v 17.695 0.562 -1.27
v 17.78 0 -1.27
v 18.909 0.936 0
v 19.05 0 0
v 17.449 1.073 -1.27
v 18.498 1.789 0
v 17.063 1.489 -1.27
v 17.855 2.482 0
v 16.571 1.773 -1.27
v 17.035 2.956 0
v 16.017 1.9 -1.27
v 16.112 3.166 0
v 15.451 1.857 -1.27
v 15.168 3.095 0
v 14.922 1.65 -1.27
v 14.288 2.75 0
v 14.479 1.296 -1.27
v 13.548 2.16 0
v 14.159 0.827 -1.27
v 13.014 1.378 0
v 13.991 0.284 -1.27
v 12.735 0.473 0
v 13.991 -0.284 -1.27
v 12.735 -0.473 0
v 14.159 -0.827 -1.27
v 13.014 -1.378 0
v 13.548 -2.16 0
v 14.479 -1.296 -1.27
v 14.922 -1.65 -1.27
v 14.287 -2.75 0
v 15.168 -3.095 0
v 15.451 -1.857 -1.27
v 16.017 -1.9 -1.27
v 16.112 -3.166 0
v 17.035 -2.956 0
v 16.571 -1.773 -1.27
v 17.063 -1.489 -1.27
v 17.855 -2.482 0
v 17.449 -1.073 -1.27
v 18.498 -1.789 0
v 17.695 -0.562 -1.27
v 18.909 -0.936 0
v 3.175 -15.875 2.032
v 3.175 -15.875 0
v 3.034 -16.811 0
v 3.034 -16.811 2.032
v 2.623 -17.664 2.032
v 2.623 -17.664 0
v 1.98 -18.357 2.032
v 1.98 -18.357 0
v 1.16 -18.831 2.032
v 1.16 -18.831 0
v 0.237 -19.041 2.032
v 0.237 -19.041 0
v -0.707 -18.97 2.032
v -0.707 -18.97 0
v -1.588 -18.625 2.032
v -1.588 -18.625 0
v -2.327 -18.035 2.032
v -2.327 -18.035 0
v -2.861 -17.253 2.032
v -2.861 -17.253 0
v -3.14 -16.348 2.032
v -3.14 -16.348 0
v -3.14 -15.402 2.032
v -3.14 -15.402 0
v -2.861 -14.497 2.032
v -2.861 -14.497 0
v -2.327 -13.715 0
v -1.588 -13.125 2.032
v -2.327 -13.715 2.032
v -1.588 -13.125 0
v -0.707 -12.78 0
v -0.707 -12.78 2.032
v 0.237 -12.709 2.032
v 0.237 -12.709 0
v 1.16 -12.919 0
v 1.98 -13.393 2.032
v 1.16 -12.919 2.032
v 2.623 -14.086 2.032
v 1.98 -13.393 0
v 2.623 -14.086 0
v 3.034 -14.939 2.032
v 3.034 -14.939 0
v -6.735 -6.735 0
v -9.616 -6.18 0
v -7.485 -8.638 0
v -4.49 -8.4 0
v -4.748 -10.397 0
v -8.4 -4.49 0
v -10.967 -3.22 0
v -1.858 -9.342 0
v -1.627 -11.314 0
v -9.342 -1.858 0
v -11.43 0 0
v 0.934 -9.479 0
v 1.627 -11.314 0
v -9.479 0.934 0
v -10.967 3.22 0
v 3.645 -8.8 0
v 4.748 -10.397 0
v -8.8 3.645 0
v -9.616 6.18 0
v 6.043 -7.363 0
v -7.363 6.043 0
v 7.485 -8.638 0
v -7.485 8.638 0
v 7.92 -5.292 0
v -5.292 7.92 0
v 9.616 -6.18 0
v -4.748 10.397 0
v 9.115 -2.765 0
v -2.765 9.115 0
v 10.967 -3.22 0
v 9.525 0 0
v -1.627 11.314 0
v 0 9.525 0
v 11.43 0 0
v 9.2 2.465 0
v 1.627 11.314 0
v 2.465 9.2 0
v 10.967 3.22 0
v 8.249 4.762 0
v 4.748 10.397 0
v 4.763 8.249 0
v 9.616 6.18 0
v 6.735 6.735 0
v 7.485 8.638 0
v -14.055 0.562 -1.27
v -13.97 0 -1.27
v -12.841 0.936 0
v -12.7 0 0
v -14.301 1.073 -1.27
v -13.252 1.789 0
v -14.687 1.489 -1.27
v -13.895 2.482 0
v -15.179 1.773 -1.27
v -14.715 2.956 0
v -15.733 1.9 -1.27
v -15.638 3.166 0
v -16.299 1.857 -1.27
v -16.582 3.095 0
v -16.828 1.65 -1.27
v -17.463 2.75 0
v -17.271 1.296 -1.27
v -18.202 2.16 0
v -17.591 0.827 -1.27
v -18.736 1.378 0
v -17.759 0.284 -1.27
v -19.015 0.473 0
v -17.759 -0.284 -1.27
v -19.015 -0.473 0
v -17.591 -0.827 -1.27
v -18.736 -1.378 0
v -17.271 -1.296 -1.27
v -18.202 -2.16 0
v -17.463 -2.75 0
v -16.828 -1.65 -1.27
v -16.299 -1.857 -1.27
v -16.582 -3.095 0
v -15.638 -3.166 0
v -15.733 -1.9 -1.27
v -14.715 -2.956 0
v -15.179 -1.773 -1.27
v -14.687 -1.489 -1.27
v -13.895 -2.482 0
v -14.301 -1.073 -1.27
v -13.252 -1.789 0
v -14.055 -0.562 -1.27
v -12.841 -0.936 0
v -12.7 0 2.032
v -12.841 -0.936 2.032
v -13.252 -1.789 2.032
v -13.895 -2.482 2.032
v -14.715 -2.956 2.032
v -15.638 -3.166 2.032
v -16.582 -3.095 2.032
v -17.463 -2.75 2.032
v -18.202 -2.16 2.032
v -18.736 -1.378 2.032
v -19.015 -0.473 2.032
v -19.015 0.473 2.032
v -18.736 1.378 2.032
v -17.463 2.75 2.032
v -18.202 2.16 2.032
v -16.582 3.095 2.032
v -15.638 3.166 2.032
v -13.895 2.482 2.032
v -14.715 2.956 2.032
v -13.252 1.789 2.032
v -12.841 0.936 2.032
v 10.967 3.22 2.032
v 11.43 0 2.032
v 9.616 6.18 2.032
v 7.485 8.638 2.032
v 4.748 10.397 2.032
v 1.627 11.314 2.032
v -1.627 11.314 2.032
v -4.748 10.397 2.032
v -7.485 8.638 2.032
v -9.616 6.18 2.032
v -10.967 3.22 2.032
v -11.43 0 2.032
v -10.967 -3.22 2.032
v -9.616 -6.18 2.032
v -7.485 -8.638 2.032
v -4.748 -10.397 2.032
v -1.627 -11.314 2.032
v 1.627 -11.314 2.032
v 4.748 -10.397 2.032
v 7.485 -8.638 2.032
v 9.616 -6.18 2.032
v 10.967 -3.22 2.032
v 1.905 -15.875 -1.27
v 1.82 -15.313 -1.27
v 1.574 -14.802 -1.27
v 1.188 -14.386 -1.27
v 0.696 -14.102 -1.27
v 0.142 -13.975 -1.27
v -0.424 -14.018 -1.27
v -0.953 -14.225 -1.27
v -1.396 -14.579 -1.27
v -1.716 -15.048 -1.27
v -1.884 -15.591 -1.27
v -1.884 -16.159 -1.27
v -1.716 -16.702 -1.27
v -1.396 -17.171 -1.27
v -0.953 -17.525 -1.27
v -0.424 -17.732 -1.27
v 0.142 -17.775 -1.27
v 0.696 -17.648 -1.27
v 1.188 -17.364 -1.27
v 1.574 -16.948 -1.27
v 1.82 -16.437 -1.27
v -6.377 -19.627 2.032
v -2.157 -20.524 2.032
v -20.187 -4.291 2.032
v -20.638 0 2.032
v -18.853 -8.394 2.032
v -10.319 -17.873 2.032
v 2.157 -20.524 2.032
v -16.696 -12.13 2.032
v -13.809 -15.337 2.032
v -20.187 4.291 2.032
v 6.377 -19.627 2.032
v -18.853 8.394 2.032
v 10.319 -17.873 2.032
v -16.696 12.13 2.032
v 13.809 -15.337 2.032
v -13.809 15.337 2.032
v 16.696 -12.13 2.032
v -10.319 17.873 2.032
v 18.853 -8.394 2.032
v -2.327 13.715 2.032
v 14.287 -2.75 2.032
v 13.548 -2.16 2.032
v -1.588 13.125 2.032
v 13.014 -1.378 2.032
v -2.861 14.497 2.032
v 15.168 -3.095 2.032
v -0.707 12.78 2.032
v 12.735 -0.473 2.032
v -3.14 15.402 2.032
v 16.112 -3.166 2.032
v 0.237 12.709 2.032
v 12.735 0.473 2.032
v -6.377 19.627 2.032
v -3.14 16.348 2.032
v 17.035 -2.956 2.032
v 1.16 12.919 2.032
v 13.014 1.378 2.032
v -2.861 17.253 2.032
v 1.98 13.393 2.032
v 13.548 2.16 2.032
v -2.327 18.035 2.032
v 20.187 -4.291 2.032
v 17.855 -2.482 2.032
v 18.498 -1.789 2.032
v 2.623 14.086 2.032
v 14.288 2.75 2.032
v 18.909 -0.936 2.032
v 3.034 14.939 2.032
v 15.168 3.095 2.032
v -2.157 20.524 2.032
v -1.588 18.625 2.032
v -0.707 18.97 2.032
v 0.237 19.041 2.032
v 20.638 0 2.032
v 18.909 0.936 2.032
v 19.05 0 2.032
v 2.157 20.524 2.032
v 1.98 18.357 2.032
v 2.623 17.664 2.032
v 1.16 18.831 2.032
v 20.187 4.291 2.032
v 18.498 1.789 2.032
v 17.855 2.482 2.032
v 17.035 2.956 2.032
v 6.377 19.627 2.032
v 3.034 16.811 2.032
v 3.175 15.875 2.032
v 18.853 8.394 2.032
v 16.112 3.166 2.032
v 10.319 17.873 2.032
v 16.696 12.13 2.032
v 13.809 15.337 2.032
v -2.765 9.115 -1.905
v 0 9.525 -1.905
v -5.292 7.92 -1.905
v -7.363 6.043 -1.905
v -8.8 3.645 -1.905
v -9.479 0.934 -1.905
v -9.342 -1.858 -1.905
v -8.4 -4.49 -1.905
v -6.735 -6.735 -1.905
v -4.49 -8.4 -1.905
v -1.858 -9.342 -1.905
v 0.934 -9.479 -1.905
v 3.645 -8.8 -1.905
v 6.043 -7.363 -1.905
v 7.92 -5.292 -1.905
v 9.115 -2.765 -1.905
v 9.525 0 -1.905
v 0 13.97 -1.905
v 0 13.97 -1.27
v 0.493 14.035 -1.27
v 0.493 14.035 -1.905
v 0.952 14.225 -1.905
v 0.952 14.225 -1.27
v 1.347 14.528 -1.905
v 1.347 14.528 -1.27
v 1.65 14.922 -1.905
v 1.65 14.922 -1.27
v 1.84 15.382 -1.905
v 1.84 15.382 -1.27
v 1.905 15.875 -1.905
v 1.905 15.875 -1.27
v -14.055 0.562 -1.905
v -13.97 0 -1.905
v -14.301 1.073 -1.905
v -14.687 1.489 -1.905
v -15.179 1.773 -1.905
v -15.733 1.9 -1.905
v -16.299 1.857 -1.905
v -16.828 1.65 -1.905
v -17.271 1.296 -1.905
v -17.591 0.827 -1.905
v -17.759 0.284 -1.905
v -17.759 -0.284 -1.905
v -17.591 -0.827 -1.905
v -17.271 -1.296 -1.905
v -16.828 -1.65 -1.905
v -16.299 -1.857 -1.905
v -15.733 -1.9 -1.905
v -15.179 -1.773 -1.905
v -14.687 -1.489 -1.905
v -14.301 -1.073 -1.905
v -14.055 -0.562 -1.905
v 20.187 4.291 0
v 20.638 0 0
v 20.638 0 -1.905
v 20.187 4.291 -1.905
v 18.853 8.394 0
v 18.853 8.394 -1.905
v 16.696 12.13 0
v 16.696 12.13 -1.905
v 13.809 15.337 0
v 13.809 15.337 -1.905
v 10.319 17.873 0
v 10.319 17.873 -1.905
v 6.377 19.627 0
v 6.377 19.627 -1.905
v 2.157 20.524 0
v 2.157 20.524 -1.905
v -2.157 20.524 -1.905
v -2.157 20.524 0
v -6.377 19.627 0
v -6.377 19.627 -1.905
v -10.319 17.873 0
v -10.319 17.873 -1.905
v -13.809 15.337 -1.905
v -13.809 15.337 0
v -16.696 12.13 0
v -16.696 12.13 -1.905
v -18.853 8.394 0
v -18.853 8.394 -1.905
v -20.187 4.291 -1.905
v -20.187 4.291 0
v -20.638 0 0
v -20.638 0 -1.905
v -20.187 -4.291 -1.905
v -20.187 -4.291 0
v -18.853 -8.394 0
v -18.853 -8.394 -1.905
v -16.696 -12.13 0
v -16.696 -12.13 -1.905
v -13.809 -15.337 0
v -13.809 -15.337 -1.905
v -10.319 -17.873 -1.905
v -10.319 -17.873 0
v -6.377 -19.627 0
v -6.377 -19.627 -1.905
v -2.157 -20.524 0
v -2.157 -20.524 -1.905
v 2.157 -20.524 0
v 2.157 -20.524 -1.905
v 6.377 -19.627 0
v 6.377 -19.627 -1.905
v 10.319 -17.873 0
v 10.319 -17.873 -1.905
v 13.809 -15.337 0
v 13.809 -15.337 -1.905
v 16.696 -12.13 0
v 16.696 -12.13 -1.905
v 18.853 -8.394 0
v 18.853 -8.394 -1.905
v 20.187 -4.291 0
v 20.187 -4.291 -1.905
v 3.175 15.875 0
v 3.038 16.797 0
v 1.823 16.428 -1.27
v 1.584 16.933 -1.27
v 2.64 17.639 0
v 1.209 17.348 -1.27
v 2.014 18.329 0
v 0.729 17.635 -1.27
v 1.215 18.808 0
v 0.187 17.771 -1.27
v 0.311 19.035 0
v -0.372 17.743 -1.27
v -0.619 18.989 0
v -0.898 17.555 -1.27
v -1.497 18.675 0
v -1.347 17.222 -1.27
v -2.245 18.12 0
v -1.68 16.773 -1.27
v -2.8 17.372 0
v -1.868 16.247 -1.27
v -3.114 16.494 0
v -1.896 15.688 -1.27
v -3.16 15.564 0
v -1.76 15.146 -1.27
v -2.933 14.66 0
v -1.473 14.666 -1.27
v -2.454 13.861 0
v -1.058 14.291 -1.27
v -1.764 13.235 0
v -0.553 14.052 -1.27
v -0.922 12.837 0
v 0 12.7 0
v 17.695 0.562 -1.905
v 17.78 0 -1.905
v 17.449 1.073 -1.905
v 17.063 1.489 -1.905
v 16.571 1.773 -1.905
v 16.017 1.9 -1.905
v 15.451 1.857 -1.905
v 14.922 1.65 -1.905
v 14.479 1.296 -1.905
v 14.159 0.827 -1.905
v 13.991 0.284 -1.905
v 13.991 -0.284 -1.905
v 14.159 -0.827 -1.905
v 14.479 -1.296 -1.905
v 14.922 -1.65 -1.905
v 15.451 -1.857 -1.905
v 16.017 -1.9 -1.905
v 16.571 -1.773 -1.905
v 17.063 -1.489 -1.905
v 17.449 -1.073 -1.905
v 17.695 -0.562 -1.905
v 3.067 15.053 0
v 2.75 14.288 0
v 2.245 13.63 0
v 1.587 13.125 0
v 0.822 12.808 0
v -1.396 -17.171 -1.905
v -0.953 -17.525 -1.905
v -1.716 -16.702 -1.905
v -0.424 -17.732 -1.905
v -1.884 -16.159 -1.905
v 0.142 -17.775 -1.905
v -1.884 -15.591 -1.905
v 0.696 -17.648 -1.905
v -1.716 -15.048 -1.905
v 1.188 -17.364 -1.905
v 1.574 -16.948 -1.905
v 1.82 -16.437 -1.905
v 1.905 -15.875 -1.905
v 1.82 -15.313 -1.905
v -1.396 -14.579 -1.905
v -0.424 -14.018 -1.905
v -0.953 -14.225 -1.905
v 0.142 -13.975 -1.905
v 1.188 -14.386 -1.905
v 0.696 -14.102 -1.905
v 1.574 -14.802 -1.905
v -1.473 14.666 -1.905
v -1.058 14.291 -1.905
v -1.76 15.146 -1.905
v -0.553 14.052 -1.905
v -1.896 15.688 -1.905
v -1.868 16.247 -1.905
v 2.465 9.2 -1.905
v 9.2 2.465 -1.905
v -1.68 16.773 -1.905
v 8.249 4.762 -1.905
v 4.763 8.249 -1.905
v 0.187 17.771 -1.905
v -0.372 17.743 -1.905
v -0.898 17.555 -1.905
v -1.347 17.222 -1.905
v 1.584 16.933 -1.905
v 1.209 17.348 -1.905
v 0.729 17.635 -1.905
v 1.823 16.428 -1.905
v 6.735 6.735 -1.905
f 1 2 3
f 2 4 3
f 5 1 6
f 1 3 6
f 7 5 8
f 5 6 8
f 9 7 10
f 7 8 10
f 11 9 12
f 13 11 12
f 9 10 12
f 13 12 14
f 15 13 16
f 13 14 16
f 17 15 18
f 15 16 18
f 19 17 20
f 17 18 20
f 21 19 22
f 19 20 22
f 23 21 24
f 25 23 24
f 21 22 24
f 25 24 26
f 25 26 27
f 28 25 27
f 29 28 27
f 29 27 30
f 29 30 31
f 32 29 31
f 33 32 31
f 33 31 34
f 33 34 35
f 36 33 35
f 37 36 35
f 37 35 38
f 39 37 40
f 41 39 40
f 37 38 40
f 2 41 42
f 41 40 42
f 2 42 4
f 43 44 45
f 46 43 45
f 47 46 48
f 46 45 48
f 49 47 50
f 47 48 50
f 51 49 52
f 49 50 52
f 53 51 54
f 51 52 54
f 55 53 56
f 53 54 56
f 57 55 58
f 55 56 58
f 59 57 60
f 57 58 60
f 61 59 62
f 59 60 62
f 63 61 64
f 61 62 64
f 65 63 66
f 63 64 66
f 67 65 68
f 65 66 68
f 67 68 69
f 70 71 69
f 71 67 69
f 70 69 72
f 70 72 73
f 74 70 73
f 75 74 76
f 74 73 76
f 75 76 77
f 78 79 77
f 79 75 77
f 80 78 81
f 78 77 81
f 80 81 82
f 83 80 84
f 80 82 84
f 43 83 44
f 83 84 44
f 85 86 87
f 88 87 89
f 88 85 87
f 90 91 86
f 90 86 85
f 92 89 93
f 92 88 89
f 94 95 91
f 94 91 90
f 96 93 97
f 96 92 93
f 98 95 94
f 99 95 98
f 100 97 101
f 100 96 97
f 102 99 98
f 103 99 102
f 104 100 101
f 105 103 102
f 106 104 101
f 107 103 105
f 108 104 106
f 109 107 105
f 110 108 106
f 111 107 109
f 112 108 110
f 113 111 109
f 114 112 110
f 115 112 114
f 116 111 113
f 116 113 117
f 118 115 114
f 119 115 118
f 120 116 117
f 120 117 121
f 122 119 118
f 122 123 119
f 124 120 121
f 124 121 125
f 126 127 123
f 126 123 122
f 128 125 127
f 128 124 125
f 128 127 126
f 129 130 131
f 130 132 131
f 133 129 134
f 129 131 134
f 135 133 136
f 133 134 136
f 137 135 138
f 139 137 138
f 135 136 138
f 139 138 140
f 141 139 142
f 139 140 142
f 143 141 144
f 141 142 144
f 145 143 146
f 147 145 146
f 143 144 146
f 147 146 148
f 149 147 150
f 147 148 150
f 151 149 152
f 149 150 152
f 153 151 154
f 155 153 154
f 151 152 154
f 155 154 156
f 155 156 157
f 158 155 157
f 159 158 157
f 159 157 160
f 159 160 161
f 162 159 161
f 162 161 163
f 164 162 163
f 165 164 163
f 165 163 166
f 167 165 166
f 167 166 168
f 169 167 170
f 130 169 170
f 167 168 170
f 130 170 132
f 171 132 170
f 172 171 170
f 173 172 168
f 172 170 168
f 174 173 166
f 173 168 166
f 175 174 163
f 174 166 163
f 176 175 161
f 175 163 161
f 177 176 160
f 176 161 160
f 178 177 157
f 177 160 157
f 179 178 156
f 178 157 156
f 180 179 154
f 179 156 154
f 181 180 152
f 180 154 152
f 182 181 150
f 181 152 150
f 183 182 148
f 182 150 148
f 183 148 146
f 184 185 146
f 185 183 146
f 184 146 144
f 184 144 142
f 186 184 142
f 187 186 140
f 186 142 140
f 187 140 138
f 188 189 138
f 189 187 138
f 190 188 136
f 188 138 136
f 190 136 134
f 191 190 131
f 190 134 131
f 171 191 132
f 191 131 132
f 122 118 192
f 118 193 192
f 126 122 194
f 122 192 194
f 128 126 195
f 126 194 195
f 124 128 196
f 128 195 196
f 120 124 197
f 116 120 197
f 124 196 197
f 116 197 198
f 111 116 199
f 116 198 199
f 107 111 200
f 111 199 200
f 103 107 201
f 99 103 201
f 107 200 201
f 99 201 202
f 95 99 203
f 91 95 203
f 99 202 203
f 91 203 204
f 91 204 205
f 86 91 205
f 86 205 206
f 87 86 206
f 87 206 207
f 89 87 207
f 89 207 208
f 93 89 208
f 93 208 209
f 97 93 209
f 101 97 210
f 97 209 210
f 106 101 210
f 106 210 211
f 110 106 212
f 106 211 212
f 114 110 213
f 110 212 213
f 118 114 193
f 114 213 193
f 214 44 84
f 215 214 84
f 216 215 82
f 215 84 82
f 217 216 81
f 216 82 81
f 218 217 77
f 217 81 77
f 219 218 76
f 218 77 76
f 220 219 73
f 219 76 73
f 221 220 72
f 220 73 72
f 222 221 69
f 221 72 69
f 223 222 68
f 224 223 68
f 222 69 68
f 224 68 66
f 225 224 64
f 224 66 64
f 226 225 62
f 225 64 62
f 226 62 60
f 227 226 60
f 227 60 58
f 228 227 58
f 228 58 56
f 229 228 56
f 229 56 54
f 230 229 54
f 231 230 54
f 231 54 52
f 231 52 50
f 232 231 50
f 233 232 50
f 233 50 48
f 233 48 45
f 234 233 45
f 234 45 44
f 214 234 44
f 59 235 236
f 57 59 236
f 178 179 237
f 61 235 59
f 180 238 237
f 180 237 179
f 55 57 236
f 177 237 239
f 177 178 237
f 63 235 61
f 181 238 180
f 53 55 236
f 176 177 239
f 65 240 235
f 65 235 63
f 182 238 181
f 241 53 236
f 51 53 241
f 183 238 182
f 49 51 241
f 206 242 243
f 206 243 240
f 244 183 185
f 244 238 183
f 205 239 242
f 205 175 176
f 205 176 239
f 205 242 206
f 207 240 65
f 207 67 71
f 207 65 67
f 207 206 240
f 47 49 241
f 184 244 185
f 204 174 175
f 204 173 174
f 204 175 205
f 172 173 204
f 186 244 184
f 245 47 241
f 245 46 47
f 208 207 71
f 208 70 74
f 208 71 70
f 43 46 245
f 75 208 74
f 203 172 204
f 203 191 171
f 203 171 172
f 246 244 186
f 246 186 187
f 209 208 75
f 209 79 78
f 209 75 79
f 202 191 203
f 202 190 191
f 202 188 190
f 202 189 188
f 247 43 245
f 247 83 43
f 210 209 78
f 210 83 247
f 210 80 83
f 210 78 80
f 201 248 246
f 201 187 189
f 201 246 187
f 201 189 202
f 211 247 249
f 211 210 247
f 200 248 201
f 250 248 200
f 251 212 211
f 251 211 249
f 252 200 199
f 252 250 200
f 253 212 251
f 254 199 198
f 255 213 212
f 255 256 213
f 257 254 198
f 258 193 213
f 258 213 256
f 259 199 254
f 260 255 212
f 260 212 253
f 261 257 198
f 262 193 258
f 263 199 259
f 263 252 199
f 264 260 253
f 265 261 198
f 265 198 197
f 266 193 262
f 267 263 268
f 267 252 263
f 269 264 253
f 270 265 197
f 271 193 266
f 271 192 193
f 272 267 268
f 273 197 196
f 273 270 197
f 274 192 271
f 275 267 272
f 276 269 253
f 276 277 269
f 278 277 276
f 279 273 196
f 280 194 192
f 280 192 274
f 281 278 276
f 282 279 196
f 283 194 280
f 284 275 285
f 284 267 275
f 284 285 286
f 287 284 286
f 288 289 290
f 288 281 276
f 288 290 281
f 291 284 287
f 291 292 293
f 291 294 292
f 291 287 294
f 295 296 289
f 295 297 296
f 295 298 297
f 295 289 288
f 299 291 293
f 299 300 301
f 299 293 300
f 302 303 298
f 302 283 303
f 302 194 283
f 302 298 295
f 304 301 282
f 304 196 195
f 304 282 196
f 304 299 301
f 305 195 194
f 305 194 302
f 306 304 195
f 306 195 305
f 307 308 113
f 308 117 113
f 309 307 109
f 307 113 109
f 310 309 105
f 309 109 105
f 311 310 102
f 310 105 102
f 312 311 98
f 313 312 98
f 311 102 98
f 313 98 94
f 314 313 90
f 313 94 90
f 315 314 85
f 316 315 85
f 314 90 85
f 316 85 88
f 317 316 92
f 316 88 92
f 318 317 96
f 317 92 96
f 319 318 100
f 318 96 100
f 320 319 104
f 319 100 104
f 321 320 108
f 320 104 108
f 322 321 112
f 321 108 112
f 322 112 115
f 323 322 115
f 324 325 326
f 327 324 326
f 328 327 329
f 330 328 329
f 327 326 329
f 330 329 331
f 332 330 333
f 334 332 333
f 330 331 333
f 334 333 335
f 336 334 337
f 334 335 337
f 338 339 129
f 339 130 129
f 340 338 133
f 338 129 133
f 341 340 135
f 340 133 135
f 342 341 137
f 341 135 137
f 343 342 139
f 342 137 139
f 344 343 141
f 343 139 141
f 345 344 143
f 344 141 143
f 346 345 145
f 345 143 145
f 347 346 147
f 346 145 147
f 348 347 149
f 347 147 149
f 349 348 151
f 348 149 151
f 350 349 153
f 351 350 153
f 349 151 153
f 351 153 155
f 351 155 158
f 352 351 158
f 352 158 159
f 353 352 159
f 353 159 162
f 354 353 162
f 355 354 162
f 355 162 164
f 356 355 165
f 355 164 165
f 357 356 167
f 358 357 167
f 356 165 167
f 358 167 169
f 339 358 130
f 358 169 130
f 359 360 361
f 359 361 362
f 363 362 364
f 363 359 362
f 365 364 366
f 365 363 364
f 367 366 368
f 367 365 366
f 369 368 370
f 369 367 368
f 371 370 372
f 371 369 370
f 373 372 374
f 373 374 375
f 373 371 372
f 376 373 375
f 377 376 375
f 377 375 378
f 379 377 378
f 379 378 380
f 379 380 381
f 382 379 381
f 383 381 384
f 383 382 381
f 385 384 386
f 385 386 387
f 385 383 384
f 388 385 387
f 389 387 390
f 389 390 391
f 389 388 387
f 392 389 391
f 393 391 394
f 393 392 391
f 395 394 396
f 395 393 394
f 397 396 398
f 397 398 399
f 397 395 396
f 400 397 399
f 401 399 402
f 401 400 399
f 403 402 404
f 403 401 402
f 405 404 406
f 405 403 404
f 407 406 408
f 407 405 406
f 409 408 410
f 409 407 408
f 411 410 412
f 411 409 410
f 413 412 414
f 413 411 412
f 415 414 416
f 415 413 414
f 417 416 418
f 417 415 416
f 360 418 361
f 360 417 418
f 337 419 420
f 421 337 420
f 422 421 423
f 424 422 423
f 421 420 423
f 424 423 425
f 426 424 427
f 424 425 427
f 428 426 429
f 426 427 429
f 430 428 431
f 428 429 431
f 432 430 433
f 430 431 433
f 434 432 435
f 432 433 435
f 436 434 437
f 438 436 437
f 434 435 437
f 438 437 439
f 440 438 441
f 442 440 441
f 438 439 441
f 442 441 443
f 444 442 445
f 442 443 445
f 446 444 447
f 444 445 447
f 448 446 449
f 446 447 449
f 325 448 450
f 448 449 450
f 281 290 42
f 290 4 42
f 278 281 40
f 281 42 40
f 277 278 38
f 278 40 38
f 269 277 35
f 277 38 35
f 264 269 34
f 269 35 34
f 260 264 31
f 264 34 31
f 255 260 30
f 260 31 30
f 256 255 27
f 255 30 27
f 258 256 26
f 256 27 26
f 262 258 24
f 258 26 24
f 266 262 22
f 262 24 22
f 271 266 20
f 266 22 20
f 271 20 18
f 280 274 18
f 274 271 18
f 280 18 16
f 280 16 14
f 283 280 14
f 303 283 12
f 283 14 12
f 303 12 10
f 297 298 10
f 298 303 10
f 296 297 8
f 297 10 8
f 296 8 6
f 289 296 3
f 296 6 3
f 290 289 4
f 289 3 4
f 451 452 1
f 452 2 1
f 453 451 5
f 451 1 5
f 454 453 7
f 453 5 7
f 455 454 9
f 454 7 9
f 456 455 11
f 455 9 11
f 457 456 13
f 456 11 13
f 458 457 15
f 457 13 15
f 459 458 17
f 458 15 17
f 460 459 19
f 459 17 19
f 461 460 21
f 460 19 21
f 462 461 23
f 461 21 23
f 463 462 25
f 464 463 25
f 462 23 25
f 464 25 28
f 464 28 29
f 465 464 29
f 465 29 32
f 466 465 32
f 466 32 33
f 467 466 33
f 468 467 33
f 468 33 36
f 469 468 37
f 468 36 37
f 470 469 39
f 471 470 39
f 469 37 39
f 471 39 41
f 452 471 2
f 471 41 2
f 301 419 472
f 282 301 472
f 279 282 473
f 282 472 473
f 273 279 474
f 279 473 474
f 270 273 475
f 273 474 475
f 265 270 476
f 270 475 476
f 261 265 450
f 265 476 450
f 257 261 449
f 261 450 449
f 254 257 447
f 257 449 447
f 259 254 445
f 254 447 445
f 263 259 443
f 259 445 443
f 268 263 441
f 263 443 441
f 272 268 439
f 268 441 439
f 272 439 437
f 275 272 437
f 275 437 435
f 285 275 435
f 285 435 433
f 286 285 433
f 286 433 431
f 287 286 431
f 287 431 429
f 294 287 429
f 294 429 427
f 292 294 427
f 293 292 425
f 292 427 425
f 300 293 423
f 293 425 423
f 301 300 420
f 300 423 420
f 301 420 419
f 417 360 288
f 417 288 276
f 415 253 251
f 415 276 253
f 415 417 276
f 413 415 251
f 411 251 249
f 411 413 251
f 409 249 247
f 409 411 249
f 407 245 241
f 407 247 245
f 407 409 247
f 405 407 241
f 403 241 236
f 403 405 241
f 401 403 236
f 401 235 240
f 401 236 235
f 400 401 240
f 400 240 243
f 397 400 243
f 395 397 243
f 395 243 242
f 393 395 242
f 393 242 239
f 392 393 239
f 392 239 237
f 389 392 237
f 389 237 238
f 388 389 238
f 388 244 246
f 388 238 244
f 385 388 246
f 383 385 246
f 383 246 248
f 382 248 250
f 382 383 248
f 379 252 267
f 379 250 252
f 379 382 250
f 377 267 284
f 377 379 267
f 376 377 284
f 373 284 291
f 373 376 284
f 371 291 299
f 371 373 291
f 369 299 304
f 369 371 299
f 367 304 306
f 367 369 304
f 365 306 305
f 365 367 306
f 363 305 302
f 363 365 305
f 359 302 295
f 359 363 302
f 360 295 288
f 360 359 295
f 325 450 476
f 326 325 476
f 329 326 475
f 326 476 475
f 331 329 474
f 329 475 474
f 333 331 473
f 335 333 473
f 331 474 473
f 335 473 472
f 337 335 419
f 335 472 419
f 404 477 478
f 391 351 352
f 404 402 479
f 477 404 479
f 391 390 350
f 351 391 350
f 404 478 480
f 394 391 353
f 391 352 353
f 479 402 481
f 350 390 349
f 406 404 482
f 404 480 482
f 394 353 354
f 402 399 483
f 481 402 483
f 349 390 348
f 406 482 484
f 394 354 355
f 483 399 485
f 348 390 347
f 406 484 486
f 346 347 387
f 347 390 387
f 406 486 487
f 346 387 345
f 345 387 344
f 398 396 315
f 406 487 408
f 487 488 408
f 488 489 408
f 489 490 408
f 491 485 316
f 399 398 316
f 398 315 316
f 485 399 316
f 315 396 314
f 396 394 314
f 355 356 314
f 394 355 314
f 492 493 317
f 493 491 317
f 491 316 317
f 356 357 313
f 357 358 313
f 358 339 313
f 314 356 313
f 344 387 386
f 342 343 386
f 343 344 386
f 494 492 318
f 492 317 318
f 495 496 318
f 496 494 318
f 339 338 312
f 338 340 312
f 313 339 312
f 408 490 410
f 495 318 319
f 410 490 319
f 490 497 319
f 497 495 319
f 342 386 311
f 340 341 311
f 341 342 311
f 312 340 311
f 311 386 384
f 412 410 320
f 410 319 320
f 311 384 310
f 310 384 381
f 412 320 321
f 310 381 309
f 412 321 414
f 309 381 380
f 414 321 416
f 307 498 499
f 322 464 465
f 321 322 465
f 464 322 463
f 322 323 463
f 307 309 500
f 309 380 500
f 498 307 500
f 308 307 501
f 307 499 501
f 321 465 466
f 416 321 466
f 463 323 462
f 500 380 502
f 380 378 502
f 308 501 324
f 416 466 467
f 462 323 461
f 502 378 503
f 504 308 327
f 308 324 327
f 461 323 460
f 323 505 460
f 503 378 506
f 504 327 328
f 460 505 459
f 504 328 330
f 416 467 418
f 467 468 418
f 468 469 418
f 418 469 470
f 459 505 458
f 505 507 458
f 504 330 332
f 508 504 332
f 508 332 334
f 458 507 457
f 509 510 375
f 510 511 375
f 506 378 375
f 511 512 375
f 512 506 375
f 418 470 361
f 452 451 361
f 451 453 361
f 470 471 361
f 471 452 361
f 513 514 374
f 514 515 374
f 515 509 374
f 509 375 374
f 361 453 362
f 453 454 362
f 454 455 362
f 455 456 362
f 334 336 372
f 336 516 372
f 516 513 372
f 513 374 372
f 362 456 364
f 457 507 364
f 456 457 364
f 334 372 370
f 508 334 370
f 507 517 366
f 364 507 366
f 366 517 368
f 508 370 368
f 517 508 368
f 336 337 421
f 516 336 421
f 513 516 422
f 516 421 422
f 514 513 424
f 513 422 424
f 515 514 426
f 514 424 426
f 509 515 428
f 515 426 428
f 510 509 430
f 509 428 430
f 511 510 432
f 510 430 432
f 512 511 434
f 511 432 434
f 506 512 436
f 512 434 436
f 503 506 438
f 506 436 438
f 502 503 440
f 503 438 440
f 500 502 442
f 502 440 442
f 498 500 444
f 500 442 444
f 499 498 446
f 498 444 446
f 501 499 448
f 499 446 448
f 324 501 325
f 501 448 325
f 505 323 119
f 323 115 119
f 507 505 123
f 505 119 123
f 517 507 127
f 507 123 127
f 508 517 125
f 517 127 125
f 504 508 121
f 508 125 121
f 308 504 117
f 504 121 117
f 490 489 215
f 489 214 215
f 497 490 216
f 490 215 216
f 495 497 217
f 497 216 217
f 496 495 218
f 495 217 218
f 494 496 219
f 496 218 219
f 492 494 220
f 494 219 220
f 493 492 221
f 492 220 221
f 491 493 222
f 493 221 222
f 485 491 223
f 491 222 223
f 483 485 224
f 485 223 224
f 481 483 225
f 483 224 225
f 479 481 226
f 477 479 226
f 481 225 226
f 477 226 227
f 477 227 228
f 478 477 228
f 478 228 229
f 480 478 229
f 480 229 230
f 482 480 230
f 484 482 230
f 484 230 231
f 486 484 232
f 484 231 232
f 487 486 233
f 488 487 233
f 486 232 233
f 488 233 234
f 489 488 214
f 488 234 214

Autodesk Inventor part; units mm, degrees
ref_plane "YZ Plane" through (0, 0, 0) normal (1, 0, 0) x (0, 1, 0)
ref_plane "XZ Plane" through (0, 0, 0) normal (0, 1, 0) x (-1, 0, 0)
ref_plane "XY Plane" through (0, 0, 0) normal (0, 0, 1) x (1, 0, 0)
sketch "Sketch1" plane through (0, 0, 0) normal (0, 0, 1) x (1, 0, 0)
  circle A0 centre (0, 0) radius 9.525
  line L0 (0, 0) -> (0, 15.875)
  circle A1 centre (0, 15.875) radius 1.905
  circle A2 centre (-15.875, 0) radius 1.905
  circle A3 centre (0, -15.875) radius 1.905
  circle A4 centre (15.875, 0) radius 1.905
  circle A5 centre (0, 0) radius 20.6375
  dimension "d0" = 19.05
  dimension "d1" = 15.875
  dimension "d2" = 3.81
  dimension "d5" = 360
  dimension "d7" = 41.275
extrude "Extrusion1" add sketch "Sketch1" against normal blind 1.905
chamfer "Chamfer1" distance 1.27 angle 45 4 edges at (-1.905, 15.875, 0) (13.97, 0, 0) (-1.905, -15.875, 0) (-17.78, 0, 0)
sketch "Sketch4" plane through (0, 0, 0) normal (0, 0, 1) x (1, 0, 0)
  circle A0 centre (0, -15.875) radius 3.175 projected
  circle A1 centre (0, 15.875) radius 3.175 projected
  circle A2 centre (0, 0) radius 9.525 projected
  circle A3 centre (0, 0) radius 20.6375 projected
  circle A4 centre (15.875, 0) radius 3.175 projected
  circle A5 centre (-15.875, 0) radius 3.175 projected
extrude "Extrusion3" add sketch "Sketch4" along normal blind 2.032
sketch "Sketch5" plane through (0, 0, 2.032) normal (0, 0, 1) x (1, 0, 0)
  circle A0 centre (0, 0) radius 11.43
  dimension "d17" = 22.86
extrude "Extrusion4" cut sketch "Sketch5" against normal blind 2.032
properties part number "RadialBearingMountCover"
